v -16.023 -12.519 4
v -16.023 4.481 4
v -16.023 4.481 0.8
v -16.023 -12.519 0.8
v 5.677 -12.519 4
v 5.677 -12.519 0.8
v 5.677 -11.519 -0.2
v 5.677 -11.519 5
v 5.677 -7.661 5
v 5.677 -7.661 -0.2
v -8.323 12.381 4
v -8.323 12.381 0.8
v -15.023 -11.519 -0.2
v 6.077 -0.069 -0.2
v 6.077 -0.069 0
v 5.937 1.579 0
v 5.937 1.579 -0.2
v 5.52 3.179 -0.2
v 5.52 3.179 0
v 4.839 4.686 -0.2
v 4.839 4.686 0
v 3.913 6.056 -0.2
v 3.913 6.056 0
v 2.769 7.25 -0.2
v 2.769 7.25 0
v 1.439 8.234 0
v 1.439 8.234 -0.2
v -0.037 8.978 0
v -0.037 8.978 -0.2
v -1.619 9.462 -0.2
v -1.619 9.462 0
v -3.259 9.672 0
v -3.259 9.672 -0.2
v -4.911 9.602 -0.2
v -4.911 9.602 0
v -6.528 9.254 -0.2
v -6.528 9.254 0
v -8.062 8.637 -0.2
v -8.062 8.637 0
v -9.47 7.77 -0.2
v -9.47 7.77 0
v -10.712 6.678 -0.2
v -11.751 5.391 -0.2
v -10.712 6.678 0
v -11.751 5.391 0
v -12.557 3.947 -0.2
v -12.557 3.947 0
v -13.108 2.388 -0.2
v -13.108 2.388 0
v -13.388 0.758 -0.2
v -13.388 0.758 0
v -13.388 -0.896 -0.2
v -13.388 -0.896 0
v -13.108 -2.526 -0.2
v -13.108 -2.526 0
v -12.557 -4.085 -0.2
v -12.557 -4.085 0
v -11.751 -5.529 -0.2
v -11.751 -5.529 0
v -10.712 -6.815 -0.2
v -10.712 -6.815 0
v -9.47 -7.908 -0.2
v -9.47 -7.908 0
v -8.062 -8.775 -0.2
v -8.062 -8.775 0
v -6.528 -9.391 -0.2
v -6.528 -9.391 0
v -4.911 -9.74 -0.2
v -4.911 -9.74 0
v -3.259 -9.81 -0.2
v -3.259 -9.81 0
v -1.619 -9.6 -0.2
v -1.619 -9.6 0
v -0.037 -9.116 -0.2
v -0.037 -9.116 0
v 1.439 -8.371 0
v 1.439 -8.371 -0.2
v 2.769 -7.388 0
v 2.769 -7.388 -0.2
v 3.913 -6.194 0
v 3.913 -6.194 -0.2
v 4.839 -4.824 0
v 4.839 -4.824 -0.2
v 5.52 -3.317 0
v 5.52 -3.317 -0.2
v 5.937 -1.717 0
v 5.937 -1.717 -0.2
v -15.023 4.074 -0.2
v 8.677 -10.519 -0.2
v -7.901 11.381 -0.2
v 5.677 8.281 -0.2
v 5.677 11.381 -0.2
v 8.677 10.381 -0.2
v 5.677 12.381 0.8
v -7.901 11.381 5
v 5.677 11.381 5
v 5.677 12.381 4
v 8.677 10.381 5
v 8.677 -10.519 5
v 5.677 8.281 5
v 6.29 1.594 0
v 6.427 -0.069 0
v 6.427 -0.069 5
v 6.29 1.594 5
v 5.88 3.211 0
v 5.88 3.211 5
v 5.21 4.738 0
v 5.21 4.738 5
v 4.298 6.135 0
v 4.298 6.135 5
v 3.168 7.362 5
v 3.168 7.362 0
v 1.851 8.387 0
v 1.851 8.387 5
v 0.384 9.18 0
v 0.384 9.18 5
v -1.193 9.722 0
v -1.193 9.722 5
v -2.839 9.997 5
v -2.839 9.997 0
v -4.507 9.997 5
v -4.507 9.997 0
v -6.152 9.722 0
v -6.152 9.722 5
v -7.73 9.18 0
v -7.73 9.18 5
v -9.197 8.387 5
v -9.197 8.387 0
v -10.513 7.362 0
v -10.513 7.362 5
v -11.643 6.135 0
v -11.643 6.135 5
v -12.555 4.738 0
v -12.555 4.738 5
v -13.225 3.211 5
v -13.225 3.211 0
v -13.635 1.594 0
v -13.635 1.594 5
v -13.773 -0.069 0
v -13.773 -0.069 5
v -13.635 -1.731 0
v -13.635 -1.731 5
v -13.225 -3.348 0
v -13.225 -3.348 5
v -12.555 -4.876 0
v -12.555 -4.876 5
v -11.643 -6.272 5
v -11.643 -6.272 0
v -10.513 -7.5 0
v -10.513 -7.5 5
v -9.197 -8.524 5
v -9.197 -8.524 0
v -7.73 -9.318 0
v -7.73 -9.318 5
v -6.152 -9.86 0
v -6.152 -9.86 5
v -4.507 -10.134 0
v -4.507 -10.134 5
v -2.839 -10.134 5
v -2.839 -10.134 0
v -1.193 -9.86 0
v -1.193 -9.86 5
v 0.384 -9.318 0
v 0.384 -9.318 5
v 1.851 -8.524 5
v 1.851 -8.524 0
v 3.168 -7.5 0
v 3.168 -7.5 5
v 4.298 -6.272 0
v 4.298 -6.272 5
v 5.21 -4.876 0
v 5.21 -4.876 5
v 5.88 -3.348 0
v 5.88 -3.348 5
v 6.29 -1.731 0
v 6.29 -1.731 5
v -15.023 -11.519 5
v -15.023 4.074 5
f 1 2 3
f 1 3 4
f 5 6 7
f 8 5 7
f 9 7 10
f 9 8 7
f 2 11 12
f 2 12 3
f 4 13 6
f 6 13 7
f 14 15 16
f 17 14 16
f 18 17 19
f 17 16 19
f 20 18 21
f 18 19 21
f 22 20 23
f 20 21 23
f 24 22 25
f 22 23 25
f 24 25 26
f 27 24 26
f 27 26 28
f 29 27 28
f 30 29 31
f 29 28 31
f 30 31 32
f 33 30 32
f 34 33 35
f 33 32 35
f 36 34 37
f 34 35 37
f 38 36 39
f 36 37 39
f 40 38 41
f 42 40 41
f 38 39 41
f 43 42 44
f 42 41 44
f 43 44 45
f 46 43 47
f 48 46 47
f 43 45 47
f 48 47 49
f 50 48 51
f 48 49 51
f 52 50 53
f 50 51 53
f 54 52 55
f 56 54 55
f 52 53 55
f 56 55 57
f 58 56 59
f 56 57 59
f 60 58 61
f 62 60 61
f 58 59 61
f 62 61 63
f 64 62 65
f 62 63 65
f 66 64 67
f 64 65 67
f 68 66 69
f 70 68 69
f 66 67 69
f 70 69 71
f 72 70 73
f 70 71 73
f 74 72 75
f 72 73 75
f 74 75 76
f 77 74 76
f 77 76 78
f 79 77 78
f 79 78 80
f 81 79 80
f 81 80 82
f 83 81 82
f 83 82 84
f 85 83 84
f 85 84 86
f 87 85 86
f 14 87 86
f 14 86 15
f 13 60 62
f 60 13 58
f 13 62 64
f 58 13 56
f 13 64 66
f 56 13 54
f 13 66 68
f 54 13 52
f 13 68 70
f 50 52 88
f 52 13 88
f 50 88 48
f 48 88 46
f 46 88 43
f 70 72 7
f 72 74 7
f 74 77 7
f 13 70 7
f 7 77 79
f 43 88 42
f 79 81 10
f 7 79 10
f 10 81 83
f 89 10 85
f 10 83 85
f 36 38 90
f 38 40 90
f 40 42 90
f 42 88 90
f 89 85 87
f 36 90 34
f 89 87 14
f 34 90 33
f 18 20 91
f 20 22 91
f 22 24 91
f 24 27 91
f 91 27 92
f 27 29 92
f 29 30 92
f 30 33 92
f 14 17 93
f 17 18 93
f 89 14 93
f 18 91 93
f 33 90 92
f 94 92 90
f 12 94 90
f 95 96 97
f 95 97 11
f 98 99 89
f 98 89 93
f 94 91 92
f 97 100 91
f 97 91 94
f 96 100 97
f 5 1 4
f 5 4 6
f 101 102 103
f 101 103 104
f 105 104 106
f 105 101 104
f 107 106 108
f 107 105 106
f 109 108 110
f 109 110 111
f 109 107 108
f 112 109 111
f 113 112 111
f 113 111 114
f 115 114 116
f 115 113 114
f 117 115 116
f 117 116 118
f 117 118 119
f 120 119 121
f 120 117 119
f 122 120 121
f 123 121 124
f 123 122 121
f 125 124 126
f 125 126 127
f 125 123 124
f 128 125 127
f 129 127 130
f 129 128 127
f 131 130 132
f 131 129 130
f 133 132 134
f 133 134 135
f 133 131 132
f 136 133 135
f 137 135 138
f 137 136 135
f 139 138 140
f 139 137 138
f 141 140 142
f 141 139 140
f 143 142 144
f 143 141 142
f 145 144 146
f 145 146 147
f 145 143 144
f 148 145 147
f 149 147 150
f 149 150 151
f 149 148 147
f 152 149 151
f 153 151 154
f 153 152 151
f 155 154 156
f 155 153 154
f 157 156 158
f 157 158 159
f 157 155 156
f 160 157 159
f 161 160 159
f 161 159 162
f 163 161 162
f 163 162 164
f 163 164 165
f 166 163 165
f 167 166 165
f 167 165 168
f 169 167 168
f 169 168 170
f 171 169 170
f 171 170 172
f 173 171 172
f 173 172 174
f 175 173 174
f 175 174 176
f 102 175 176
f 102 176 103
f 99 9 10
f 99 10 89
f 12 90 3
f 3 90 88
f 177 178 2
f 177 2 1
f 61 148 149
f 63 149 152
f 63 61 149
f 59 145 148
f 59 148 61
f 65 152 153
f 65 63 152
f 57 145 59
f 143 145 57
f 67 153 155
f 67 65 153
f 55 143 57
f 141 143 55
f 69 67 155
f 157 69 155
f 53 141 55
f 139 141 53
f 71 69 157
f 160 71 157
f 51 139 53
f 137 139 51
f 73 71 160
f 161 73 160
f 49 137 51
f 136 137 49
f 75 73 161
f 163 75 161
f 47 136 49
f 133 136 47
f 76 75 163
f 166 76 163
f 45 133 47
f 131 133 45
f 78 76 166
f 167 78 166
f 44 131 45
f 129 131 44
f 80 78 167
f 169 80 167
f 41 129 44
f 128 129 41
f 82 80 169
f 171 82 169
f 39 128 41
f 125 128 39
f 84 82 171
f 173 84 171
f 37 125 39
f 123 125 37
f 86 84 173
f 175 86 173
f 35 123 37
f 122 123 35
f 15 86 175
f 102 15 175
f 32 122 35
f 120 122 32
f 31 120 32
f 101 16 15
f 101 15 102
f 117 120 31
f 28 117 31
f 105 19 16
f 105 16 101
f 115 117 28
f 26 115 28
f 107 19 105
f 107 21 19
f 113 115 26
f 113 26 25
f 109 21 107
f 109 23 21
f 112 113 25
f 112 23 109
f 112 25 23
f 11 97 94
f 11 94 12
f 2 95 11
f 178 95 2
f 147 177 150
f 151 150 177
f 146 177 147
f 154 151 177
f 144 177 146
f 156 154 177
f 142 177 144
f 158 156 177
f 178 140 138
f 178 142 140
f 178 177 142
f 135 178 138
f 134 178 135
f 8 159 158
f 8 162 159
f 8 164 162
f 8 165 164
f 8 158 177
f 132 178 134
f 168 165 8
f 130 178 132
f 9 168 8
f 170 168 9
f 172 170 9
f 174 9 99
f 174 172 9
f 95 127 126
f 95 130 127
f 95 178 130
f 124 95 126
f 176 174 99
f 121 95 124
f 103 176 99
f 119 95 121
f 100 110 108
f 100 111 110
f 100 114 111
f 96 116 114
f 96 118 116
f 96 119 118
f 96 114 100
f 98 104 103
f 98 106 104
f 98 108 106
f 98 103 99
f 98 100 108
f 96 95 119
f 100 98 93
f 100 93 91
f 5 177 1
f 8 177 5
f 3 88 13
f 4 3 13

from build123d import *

# Parameters (mm, degrees)
F0_R     = 10.1
F1_DEPTH = 5
F0_R_2   = 9.75
F2_DEPTH = 0.2
F3_SIZE  = 1


with BuildPart() as f1:
    # F0 (on Top) → F1 (new body)
    with BuildSketch(Plane.XY):
        Polygon((-16.0227272727, -12.5188677256), (5.6772727273, -12.5188677256), (5.6772727273, -7.6613227439), (8.6772727273, -10.5188677256), (8.6772727273, 10.3811322744), (5.6772727273, 8.2811322744), (5.6772727273, 12.3811322744), (-8.3227272727, 12.3811322744), (-16.0227272727, 4.4811322744), align=None)
        with Locations((-3.6727272727, -0.0688677256)):
            Circle(F0_R, mode=Mode.SUBTRACT)
    extrude(amount=F1_DEPTH)

    # F0 (on Top) → F2 (join)
    with BuildSketch(Plane.XY):
        Polygon((-16.0227272727, -12.5188677256), (5.6772727273, -12.5188677256), (5.6772727273, -7.6613227439), (8.6772727273, -10.5188677256), (8.6772727273, 10.3811322744), (5.6772727273, 8.2811322744), (5.6772727273, 12.3811322744), (-8.3227272727, 12.3811322744), (-16.0227272727, 4.4811322744), align=None)
        with Locations((-3.6727272727, -0.0688677256)):
            Circle(F0_R, mode=Mode.SUBTRACT)
        with Locations((-3.6727272727, -0.0688677256)):
            Circle(F0_R)
        with Locations((-3.6727272727, -0.0688677256)):
            Circle(F0_R_2, mode=Mode.SUBTRACT)
    extrude(amount=-F2_DEPTH)

    # F3
    f3_edges = [f1.edges().sort_by_distance(p)[0] for p in [
        (-5.172727, -12.518868, 5),
        (-16.022727, -4.018868, 5),
        (-12.172727, 8.431132, 5),
        (-1.322727, 12.381132, 5),
        (-1.322727, 12.381132, -0.2),
        (-12.172727, 8.431132, -0.2),
        (-16.022727, -4.018868, -0.2),
        (-5.172727, -12.518868, -0.2),
    ]]
    chamfer(f3_edges, length=F3_SIZE)


solid = f1.part
